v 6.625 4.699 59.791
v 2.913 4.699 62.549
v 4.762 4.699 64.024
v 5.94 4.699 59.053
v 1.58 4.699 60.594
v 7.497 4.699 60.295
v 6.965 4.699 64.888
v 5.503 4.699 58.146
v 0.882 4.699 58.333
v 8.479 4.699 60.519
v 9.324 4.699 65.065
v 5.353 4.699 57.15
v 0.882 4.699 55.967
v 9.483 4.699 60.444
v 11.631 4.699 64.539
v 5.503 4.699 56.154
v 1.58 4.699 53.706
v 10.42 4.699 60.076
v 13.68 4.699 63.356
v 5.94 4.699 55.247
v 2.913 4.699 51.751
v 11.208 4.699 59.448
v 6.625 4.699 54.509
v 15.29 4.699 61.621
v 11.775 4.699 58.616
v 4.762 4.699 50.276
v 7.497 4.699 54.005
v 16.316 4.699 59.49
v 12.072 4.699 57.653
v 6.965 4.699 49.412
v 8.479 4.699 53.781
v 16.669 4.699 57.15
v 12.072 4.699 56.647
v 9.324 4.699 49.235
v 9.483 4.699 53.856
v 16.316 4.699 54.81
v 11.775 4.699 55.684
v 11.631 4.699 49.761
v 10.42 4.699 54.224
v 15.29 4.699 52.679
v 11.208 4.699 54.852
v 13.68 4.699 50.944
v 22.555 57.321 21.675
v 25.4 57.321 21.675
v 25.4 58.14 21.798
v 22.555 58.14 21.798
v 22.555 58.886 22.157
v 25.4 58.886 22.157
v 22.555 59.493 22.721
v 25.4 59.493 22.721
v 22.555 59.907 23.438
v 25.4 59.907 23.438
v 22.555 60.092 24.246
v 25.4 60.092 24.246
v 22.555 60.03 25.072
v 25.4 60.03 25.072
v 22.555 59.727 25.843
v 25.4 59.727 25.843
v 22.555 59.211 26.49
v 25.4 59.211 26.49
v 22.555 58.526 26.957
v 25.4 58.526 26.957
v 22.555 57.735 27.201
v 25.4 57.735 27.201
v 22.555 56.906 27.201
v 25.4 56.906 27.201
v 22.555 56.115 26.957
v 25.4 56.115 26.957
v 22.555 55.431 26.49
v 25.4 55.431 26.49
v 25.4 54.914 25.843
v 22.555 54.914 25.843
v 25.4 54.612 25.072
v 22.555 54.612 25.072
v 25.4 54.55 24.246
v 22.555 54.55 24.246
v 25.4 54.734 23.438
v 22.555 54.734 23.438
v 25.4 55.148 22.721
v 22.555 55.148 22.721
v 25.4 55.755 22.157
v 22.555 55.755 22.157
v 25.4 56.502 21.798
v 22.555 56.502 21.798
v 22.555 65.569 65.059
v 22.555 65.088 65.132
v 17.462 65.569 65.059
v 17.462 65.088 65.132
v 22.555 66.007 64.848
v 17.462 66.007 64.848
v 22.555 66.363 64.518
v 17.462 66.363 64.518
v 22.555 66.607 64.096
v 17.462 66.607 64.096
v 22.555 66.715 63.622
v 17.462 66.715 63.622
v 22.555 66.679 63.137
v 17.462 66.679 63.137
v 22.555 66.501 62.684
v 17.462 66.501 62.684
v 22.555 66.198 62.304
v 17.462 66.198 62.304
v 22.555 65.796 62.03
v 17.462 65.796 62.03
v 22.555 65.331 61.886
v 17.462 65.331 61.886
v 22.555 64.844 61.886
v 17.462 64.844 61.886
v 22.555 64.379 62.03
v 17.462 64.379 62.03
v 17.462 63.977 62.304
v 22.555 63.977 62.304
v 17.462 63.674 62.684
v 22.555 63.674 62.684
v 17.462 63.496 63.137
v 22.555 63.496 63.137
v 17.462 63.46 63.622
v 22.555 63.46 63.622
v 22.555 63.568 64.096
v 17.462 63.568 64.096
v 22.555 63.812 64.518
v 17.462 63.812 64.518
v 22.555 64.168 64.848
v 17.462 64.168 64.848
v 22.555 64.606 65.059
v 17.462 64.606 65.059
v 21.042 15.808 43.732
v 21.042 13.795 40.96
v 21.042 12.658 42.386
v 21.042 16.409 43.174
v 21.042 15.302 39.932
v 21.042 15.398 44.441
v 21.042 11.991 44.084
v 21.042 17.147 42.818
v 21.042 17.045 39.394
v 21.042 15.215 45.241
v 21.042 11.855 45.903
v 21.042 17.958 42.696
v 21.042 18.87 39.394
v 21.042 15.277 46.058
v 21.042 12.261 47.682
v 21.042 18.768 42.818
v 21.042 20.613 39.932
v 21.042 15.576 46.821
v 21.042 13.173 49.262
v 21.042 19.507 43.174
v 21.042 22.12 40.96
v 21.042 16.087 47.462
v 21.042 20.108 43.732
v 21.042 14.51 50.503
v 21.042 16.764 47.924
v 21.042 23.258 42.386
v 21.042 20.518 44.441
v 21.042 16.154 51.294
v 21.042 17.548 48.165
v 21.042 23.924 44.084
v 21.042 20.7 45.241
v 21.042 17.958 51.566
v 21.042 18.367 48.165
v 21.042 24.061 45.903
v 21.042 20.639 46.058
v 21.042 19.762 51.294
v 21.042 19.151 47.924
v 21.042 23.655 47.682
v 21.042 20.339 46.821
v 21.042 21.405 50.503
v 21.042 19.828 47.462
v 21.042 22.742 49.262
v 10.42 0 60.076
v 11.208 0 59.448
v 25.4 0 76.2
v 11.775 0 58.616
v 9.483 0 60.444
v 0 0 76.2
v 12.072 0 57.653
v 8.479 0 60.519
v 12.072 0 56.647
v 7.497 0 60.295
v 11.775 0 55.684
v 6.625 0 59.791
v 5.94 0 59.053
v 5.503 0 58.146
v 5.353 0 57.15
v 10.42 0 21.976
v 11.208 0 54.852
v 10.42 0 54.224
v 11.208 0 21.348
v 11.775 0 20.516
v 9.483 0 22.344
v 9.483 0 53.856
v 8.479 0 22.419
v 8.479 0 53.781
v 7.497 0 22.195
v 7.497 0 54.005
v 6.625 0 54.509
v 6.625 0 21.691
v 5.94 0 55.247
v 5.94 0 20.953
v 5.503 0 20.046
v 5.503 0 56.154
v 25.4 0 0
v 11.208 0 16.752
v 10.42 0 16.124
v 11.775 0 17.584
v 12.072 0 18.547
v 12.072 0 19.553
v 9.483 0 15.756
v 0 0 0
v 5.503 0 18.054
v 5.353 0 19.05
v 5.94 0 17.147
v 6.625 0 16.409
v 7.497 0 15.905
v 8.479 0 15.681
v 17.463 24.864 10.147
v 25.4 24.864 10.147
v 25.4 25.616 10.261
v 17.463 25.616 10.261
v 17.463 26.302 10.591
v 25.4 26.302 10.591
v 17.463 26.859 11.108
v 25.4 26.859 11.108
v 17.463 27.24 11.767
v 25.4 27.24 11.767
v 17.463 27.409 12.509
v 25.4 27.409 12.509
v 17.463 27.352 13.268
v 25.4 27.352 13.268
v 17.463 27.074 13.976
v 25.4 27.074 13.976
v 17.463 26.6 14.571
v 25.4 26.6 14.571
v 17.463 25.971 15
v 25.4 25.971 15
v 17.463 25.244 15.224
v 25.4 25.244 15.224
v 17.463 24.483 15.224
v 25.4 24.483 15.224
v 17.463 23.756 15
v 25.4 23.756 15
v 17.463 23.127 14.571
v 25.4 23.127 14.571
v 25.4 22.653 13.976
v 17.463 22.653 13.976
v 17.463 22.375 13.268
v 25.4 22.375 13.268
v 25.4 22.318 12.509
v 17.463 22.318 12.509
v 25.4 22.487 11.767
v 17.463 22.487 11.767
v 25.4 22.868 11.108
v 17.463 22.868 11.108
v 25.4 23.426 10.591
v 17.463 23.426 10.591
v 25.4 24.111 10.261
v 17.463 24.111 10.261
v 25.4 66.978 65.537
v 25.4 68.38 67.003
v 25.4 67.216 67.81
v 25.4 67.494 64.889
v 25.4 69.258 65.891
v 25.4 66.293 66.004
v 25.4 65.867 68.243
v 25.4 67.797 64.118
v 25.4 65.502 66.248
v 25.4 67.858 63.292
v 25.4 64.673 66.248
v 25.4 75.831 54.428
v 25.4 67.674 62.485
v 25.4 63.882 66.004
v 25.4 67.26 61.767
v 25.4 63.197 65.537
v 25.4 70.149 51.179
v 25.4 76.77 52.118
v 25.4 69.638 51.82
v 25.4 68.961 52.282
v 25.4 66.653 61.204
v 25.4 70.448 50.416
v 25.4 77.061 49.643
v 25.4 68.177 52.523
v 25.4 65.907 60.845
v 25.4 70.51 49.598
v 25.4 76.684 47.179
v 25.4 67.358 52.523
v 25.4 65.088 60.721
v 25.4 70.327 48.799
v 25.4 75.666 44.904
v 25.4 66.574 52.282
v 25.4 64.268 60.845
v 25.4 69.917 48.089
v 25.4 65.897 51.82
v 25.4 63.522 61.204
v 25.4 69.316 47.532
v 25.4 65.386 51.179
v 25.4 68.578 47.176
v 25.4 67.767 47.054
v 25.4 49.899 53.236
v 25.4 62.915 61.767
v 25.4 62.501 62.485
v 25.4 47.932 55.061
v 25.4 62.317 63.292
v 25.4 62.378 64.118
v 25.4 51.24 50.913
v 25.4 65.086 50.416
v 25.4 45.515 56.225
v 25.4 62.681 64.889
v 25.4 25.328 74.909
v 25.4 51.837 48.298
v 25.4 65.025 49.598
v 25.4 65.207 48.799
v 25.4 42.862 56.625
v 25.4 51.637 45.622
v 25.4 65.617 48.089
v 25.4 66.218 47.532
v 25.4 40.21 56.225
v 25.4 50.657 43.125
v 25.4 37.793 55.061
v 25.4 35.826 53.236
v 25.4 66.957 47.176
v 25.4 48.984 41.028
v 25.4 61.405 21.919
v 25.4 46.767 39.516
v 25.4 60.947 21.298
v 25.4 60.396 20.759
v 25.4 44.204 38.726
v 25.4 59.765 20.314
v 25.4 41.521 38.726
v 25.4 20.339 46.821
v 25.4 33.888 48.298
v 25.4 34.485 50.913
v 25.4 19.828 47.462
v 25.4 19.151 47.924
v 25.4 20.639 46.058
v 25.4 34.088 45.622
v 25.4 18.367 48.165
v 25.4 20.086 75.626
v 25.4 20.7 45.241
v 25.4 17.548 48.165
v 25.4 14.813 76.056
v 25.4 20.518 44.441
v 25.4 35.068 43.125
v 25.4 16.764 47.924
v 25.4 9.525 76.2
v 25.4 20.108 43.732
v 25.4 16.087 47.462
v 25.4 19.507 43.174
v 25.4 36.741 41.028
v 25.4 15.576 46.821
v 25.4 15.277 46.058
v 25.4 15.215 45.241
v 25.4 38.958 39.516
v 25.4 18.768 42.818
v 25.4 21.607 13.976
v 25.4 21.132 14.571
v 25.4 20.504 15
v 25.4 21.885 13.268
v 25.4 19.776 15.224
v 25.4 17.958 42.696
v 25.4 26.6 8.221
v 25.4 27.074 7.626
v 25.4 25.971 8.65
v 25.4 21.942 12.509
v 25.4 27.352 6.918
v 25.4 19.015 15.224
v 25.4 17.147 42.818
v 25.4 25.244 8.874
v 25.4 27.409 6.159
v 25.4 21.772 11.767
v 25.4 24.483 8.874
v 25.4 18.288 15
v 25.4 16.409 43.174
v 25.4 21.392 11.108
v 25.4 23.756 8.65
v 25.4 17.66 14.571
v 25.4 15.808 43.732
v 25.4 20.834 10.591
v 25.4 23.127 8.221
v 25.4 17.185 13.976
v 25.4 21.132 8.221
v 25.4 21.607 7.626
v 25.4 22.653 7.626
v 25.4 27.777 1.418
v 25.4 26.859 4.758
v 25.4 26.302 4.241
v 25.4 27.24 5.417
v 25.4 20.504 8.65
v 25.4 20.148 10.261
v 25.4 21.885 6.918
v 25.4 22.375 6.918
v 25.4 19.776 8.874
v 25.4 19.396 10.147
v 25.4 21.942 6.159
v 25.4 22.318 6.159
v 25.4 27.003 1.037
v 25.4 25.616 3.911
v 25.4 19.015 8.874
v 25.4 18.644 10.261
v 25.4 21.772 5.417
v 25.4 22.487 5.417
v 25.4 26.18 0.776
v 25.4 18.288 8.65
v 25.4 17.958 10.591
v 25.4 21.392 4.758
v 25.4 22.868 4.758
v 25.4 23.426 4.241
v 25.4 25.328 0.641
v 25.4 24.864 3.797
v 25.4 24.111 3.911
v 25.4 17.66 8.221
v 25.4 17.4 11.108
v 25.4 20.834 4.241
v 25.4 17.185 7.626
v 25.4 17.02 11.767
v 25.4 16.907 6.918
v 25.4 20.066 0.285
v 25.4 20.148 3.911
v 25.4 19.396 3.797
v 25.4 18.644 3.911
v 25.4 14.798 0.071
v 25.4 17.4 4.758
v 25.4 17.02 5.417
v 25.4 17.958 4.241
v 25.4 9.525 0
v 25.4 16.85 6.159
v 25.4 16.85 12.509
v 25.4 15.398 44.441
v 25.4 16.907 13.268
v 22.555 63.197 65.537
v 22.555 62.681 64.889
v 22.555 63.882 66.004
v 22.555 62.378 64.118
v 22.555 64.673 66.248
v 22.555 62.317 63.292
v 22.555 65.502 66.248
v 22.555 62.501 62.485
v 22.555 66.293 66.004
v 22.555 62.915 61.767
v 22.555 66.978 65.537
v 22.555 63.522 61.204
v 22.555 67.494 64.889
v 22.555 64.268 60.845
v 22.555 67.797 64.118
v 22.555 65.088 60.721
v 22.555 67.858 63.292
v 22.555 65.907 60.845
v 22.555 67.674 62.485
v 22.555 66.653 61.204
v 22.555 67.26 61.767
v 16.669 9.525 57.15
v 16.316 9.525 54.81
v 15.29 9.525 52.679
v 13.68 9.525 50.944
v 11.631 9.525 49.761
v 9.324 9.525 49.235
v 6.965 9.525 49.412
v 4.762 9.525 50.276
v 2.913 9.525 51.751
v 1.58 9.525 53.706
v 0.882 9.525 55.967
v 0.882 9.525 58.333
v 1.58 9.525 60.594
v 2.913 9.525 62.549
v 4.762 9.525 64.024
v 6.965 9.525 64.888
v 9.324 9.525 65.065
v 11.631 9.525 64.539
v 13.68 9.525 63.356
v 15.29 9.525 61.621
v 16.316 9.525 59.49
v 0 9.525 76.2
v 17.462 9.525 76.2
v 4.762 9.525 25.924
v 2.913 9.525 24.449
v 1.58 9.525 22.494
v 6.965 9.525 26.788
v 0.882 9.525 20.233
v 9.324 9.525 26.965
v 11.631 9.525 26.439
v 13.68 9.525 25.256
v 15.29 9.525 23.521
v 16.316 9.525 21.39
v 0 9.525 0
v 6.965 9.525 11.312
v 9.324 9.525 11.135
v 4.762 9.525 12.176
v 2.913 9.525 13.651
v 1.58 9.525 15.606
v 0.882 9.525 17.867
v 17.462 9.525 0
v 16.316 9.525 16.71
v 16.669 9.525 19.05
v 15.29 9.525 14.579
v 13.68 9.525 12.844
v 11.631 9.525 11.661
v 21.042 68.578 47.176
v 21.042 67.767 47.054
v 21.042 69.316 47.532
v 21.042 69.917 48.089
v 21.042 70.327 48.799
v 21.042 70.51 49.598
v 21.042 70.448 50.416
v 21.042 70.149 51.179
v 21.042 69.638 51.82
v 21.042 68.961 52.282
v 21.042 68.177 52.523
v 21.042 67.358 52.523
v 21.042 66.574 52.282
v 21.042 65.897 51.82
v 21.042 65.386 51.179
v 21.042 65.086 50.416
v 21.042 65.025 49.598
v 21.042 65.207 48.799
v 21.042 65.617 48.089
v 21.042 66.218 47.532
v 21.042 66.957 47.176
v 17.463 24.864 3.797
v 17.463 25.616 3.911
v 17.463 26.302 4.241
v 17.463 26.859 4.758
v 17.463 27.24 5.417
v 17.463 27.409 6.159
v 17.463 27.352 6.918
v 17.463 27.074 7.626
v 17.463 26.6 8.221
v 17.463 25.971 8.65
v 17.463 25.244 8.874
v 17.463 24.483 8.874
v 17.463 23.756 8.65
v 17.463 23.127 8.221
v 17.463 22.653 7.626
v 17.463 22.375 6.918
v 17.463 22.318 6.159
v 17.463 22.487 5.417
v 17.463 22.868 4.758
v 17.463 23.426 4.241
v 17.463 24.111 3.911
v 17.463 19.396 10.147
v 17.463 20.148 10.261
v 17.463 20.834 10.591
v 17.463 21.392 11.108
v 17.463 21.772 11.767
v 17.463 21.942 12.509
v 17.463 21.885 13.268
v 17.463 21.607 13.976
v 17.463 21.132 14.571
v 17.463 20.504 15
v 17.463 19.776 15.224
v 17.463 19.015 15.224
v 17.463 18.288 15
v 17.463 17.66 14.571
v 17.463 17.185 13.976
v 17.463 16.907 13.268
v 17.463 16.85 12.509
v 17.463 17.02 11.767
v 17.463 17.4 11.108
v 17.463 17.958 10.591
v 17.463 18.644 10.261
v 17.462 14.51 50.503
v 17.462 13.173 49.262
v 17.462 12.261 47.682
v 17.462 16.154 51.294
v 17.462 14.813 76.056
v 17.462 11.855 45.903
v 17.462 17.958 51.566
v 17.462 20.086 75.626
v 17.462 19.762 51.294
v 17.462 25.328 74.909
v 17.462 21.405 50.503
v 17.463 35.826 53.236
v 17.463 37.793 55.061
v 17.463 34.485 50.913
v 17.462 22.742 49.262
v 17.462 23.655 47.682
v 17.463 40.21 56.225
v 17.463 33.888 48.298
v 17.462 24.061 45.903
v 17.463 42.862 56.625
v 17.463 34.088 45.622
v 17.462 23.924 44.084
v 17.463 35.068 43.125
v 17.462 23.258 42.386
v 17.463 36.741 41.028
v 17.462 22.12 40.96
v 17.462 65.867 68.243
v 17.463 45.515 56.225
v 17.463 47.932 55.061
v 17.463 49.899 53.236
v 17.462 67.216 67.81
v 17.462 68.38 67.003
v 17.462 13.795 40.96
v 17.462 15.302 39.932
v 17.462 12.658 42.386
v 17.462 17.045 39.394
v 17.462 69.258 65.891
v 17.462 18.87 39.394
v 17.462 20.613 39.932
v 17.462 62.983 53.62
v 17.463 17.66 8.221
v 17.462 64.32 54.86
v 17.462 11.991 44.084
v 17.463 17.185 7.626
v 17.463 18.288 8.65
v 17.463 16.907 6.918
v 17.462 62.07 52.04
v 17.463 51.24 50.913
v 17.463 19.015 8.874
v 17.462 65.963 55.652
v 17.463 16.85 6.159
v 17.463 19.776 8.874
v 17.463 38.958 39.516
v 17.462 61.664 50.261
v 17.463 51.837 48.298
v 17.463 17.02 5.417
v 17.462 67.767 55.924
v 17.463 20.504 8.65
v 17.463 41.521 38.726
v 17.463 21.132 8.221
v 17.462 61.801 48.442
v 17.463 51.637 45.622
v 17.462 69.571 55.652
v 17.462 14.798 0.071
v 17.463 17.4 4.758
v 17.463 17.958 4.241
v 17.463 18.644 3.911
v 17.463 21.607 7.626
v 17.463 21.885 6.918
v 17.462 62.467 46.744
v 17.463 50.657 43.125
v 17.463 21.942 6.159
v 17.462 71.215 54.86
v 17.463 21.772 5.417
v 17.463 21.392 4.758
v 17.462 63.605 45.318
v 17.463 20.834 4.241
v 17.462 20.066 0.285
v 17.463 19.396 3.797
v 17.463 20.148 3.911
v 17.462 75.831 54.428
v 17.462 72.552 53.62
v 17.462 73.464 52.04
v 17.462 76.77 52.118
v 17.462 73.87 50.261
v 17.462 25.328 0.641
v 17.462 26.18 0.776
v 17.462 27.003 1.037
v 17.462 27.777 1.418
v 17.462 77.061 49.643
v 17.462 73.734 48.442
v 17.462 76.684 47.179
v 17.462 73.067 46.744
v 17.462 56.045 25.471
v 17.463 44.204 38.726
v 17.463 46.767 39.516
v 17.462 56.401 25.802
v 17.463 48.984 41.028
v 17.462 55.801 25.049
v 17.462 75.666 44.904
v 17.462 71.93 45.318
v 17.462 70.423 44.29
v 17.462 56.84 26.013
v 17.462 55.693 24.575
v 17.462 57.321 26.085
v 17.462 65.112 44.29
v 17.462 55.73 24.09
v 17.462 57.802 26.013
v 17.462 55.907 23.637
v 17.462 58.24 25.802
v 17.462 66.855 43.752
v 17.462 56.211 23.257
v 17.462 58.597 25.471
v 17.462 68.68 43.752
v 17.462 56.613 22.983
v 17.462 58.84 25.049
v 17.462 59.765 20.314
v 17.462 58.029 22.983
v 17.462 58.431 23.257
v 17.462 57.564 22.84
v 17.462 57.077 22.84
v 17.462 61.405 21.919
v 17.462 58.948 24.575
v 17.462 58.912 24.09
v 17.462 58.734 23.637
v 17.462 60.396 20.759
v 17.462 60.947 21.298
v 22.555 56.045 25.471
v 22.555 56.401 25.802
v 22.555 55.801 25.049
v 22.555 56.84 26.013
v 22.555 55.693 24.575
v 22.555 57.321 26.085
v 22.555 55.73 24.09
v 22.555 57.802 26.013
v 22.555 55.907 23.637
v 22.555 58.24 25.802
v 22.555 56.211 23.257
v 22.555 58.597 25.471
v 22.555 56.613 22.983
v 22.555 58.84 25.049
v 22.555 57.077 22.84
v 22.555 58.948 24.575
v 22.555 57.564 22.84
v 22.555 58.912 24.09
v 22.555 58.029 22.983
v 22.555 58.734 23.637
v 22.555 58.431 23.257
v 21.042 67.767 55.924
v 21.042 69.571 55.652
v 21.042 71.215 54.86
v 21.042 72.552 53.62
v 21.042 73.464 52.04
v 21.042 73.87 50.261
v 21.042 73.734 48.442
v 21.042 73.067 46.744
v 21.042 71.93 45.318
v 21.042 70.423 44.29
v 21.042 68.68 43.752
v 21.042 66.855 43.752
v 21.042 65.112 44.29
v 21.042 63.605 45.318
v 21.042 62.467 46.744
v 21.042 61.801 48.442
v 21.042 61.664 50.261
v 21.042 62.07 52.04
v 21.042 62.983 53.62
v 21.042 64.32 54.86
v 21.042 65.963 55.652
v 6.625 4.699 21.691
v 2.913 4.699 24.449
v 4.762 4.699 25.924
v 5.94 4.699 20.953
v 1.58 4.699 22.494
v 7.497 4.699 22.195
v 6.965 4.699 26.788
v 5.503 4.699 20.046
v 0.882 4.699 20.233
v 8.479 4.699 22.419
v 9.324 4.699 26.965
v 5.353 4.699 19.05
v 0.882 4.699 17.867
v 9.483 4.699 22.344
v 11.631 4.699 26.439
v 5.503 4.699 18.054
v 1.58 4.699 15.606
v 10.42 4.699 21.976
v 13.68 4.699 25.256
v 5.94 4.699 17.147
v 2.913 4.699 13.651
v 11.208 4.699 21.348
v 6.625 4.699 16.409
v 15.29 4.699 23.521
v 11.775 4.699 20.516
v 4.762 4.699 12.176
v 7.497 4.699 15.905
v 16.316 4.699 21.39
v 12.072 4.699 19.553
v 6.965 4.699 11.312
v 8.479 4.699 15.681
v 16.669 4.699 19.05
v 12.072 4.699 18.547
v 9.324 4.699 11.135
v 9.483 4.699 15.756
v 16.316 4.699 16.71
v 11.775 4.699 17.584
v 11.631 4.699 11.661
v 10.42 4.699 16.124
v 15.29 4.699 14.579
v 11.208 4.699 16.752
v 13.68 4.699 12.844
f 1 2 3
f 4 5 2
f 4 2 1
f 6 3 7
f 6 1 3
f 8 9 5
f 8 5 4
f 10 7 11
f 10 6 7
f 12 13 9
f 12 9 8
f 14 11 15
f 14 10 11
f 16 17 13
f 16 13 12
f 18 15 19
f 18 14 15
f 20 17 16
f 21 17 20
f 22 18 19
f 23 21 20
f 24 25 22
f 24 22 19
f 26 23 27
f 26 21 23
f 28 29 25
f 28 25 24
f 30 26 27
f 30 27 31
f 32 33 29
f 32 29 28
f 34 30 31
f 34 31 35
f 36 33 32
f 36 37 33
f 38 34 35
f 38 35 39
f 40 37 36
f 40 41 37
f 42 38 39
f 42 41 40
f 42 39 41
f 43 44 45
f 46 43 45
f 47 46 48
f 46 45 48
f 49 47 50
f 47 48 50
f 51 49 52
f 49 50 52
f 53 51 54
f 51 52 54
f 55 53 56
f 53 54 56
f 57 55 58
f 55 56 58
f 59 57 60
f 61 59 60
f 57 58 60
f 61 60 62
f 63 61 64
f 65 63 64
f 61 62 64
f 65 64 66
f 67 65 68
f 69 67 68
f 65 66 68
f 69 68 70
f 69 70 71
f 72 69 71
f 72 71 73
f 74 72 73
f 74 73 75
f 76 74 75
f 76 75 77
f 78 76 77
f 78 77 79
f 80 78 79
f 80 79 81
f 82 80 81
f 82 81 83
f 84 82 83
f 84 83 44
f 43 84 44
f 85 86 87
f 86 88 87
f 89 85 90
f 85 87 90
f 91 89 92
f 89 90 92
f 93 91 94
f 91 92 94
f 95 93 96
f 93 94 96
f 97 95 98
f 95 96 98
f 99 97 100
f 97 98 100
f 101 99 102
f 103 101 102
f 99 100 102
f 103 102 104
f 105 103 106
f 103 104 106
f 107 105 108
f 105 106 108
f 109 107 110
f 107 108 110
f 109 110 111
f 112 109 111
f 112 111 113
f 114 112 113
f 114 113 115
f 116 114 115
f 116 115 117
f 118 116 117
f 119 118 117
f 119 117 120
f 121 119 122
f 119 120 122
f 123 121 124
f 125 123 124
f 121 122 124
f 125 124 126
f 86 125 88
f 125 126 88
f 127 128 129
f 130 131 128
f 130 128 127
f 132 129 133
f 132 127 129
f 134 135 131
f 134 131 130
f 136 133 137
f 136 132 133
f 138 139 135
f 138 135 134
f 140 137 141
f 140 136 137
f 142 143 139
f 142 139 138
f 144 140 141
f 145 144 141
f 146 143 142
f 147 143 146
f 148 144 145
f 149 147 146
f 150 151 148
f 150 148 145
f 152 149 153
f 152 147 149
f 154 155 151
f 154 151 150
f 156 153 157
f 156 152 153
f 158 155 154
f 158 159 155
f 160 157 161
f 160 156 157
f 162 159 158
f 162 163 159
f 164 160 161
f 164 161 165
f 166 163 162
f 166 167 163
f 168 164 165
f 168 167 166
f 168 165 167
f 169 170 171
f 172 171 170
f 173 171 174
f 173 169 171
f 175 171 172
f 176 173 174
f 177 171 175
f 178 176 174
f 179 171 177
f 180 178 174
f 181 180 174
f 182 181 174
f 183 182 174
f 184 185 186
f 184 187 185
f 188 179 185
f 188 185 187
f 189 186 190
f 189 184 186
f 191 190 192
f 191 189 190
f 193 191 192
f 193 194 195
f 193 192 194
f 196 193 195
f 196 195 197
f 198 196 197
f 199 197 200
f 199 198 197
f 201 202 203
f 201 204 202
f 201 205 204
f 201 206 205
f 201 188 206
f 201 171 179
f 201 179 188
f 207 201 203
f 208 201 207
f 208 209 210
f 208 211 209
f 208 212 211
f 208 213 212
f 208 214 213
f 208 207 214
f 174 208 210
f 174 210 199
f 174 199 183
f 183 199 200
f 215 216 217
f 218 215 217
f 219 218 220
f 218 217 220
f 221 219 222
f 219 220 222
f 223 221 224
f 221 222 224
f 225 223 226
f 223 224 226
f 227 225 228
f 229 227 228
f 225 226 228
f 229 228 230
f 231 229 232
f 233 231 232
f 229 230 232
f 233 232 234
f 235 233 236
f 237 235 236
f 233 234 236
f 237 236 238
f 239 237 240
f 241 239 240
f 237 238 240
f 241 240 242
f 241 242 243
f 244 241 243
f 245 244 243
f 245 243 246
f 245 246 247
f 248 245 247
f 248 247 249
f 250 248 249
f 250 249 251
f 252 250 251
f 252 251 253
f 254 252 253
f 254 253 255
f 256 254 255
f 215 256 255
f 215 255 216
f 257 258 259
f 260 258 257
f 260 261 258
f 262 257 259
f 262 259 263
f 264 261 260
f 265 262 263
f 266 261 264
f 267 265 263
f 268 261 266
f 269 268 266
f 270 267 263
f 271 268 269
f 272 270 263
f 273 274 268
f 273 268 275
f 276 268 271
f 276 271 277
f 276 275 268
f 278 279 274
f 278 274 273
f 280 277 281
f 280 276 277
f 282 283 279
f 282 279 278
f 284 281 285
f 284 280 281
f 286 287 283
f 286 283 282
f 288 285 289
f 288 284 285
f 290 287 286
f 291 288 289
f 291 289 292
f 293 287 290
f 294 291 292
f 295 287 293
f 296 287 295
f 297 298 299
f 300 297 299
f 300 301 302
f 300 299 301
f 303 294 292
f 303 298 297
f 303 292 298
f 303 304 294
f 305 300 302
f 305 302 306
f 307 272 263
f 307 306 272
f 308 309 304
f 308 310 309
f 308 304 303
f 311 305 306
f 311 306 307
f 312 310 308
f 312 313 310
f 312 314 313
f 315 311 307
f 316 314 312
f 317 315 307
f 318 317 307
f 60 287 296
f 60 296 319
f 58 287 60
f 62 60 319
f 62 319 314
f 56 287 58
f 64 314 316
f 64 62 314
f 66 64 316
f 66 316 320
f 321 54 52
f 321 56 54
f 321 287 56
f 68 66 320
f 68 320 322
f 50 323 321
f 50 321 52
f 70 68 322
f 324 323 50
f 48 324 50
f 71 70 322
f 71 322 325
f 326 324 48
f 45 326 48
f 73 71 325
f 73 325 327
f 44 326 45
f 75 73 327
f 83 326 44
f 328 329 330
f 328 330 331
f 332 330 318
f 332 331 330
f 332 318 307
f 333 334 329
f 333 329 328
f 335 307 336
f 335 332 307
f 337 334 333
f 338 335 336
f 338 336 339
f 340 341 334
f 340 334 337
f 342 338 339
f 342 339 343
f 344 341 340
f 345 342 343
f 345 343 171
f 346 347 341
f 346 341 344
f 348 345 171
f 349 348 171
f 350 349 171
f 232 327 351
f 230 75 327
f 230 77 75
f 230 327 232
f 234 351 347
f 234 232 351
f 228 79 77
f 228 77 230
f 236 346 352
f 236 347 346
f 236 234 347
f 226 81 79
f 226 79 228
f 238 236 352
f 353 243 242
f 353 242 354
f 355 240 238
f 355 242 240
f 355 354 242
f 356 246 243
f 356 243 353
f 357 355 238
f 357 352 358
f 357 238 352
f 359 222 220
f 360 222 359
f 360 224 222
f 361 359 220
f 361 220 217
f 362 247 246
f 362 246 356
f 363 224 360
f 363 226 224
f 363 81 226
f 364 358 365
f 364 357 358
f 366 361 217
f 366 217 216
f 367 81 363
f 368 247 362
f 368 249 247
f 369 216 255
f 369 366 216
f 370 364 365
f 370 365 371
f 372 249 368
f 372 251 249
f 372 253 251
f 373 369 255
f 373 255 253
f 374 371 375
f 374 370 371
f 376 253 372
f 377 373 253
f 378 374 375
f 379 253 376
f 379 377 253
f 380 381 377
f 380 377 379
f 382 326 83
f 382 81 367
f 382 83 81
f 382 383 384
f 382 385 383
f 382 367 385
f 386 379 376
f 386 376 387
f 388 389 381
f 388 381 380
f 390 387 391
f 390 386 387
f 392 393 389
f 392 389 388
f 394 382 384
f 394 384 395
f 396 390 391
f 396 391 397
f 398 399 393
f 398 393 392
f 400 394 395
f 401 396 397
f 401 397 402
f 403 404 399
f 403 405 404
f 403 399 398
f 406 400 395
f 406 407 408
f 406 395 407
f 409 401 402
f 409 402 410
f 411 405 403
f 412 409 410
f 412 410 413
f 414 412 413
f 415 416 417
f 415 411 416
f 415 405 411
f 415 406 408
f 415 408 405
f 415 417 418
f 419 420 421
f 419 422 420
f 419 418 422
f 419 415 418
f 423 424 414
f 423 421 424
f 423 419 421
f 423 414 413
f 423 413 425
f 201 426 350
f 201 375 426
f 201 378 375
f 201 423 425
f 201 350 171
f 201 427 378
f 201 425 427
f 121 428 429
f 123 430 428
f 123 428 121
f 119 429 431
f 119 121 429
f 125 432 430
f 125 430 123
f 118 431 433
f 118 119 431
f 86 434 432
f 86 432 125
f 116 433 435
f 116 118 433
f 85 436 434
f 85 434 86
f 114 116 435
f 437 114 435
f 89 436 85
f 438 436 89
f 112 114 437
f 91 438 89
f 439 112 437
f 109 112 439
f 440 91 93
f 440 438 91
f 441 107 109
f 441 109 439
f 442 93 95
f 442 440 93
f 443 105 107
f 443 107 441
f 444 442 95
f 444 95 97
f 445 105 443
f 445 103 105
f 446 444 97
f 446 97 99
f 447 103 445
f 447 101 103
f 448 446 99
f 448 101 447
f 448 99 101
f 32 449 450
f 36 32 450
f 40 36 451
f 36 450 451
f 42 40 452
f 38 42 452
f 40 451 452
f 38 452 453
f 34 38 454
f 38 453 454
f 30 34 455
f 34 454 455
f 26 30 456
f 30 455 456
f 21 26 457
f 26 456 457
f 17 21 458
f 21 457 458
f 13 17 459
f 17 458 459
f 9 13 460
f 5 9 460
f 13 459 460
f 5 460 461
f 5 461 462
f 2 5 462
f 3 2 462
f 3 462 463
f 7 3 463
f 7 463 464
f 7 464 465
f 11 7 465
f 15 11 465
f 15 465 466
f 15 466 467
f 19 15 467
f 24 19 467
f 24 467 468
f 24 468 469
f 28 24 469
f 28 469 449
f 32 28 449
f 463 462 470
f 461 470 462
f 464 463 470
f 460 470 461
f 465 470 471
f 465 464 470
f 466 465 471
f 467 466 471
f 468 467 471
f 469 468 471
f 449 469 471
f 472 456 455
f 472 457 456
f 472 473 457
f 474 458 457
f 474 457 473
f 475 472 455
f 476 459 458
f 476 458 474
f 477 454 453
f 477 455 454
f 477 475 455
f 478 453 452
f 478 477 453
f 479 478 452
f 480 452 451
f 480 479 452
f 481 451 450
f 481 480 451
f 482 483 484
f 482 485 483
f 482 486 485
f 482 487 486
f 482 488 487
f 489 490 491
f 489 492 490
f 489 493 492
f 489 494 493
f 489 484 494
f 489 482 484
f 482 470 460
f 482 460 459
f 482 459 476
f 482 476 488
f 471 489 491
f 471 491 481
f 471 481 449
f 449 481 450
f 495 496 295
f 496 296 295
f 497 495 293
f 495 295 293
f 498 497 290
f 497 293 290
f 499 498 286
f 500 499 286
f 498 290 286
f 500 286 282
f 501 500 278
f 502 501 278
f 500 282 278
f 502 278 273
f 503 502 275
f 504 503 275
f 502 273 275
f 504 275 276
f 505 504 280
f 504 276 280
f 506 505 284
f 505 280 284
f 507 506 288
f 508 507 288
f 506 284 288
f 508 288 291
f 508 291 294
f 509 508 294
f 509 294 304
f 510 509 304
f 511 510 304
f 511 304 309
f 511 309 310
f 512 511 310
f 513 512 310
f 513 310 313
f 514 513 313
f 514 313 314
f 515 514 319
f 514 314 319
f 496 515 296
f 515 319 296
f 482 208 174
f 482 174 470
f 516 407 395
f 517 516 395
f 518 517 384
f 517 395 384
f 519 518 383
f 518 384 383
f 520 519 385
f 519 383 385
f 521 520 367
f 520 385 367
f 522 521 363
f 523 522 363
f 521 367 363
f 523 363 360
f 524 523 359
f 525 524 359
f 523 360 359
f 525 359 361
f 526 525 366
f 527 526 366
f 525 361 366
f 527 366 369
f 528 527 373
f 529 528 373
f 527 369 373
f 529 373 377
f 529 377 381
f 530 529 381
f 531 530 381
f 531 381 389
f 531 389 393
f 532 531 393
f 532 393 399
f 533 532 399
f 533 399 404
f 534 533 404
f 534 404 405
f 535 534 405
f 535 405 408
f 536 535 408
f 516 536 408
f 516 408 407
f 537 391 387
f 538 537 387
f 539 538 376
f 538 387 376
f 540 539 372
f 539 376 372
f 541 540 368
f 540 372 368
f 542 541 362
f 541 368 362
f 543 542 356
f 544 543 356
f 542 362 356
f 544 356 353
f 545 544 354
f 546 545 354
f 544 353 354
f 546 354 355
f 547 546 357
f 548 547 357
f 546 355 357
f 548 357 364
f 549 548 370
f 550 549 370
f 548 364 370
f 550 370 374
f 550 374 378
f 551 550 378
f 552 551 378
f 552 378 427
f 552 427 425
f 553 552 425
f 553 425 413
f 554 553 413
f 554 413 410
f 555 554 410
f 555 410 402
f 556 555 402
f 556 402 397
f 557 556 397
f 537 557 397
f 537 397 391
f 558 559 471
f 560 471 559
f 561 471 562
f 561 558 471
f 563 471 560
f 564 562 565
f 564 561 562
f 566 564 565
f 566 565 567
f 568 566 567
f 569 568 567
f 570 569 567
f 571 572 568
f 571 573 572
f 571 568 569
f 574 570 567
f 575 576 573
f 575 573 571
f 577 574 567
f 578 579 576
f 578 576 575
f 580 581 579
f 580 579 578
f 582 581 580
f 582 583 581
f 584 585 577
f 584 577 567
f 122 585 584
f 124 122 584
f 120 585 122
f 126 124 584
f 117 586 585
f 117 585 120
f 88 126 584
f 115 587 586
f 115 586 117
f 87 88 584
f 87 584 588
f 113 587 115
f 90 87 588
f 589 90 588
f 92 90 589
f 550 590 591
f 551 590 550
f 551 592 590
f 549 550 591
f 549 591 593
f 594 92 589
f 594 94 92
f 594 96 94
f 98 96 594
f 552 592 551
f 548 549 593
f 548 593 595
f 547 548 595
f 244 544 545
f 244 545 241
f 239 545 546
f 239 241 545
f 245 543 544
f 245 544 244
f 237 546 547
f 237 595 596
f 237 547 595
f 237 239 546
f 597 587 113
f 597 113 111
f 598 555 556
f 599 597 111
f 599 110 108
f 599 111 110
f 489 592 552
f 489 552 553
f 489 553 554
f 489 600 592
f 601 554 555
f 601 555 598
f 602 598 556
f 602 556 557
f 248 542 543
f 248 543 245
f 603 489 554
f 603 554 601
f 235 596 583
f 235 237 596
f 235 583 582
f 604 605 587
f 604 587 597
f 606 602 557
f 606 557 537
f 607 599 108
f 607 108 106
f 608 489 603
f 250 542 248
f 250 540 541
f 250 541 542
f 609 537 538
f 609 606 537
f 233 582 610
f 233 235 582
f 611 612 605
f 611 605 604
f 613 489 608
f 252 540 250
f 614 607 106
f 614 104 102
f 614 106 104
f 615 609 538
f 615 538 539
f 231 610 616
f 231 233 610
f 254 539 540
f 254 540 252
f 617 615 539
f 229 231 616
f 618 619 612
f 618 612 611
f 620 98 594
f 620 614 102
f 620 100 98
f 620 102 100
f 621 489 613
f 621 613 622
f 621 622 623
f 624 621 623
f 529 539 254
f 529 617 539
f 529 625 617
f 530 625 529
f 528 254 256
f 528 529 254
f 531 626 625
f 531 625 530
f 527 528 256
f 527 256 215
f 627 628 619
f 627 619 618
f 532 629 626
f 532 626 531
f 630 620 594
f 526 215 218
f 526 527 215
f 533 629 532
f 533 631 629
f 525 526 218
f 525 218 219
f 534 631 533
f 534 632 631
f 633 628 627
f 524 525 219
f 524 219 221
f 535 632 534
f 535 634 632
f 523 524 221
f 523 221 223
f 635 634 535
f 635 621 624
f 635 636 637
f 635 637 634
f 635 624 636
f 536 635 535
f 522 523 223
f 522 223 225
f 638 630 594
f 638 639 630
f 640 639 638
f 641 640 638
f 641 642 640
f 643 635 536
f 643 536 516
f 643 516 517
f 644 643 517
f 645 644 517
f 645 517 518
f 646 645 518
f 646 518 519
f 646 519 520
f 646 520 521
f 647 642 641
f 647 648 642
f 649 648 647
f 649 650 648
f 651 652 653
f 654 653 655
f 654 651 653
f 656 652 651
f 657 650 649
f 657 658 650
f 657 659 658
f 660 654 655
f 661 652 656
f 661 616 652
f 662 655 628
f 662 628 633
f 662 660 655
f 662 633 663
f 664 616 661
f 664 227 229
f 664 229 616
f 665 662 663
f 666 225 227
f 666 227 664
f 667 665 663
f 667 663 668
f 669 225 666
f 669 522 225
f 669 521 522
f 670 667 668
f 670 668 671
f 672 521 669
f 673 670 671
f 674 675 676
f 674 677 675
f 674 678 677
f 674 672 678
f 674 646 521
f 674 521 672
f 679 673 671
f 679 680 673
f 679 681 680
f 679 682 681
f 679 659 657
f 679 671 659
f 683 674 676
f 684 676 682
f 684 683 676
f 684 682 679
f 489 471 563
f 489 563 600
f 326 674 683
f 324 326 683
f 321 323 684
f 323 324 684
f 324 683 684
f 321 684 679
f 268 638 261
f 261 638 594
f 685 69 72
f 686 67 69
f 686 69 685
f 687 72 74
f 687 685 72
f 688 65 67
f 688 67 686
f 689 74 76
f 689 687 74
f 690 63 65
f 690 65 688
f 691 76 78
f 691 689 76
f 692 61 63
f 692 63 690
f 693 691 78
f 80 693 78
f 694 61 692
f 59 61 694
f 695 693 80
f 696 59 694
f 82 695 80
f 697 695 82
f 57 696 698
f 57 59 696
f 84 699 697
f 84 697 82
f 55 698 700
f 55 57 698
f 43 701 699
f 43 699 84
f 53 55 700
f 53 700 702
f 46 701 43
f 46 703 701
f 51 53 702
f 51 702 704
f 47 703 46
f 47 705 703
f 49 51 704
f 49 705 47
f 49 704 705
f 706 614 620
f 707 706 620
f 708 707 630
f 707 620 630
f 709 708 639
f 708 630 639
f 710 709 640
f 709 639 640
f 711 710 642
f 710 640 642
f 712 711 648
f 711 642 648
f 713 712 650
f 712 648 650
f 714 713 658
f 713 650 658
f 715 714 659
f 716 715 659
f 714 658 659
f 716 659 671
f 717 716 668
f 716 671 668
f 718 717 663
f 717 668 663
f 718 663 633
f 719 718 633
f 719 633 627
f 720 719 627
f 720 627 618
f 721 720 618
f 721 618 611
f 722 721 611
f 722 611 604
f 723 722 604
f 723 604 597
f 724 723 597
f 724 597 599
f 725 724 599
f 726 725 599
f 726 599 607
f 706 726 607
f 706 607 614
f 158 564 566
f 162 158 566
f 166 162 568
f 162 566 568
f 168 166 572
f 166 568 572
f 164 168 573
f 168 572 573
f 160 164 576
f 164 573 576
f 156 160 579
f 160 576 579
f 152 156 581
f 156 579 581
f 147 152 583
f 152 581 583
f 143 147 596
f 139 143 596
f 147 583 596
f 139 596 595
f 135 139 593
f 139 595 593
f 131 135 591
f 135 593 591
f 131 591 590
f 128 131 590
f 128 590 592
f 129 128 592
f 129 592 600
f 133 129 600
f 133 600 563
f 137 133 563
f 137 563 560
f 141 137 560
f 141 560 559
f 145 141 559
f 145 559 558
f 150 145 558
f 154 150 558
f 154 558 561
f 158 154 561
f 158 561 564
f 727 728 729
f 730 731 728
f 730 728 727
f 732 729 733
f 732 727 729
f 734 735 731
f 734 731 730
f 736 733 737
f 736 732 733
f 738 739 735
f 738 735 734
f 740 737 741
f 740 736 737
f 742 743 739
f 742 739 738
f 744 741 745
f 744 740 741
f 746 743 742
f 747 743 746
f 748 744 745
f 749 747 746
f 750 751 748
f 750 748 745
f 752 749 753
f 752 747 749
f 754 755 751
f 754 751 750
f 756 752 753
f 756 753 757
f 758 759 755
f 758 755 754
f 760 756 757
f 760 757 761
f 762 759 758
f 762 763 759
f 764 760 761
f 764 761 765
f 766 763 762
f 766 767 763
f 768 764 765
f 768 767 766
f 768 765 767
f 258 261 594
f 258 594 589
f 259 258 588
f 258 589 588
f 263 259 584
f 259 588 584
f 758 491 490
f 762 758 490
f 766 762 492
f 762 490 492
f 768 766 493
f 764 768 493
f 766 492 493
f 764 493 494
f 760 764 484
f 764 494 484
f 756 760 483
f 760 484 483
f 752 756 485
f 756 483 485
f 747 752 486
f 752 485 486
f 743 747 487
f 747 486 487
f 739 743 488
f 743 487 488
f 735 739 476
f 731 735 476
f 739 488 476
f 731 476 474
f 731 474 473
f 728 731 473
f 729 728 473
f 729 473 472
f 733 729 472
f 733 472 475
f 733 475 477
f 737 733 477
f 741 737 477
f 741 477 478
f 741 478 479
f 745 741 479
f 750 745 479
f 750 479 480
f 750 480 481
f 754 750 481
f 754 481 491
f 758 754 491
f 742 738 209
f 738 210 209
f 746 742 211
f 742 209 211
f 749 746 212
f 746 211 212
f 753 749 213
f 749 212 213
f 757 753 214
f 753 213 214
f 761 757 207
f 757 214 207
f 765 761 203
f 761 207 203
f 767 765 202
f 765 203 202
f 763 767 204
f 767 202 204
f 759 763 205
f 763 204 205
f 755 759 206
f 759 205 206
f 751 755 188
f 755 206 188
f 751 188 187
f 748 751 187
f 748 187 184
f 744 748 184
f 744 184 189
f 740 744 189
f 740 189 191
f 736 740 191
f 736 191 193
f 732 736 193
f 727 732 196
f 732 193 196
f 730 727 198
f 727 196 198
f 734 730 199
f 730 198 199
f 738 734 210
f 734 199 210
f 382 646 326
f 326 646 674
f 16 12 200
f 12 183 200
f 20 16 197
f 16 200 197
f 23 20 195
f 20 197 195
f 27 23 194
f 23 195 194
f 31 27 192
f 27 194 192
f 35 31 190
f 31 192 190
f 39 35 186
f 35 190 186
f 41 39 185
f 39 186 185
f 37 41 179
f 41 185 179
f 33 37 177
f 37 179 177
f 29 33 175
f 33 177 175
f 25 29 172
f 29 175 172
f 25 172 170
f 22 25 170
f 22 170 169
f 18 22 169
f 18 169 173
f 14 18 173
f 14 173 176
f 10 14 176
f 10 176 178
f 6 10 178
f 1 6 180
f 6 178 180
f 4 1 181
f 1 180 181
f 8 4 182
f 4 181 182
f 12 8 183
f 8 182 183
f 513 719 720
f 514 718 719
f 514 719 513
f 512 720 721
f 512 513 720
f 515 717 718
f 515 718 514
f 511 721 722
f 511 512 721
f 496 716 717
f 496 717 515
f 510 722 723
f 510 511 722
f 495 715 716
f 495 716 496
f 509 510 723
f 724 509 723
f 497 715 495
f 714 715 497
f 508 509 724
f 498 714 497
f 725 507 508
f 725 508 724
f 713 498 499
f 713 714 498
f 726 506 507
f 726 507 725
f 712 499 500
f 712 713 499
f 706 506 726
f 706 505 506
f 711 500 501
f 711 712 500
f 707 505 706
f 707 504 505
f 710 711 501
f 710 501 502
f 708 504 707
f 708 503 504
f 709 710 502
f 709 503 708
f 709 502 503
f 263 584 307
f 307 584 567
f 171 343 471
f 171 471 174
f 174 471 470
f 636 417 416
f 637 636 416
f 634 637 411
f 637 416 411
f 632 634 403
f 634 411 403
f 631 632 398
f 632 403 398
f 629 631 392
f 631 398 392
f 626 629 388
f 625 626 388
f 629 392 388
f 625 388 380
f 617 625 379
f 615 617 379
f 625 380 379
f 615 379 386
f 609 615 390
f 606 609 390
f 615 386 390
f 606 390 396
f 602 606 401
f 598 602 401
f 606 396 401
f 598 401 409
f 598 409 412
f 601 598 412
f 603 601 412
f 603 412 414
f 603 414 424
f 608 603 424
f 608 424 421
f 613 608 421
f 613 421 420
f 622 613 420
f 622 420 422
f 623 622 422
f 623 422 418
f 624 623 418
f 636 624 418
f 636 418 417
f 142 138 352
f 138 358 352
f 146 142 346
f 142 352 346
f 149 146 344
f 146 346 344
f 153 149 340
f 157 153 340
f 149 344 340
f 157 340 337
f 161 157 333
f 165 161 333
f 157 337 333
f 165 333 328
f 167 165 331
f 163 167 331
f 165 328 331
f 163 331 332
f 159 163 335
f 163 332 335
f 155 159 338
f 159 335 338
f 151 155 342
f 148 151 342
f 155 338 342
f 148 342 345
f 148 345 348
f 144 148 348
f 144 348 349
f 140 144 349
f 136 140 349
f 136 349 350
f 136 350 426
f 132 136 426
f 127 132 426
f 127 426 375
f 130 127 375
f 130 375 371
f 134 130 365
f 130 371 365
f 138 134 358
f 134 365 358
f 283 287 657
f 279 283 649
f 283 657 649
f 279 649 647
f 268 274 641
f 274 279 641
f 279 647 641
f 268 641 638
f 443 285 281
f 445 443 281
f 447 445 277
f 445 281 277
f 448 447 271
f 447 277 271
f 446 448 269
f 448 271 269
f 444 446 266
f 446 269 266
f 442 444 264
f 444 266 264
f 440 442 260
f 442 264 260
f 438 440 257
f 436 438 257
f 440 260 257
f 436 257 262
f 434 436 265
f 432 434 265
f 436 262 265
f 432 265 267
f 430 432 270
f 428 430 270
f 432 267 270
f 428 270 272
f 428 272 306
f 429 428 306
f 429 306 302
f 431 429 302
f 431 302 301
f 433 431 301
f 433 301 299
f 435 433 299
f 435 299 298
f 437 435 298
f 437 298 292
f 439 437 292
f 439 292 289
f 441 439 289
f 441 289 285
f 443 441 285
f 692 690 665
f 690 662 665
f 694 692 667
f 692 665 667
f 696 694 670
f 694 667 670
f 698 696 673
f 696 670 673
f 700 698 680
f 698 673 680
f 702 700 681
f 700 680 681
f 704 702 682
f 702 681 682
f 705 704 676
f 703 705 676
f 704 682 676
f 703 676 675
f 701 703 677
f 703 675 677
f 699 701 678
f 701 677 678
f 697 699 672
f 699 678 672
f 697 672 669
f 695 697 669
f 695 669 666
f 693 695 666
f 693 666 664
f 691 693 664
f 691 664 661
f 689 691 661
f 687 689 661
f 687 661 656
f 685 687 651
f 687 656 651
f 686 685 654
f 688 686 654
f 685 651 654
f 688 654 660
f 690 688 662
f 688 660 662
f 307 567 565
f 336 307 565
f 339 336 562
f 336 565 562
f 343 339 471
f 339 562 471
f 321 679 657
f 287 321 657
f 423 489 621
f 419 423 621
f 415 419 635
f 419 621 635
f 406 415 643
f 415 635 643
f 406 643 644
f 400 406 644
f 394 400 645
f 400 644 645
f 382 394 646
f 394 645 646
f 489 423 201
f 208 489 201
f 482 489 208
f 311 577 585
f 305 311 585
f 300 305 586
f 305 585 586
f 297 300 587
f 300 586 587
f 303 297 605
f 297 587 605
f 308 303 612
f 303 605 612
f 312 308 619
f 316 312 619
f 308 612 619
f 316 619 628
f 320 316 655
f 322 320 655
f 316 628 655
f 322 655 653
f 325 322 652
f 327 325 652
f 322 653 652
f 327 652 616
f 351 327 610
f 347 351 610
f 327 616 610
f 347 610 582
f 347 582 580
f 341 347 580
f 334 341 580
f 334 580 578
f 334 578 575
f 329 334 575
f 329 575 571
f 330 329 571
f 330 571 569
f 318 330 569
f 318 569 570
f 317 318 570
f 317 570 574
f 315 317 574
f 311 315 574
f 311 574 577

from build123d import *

# Parameters (mm, degrees)
BOSS_EXTRUDE1_DEPTH                            = 76.2
F_18_0MM_DIAMETER_HOLE1_D                      = 18
CBORE_FOR_M5_HEX_HEAD_BOLT1_D                  = 5.5
CBORE_FOR_M5_HEX_HEAD_BOLT1_DEPTH              = 45.974
CBORE_FOR_M5_HEX_HEAD_BOLT1_CBORE_D            = 12.24
CBORE_FOR_M5_HEX_HEAD_BOLT1_CBORE_DEPTH        = 3.58
CBORE_FOR_M5_HEX_HEAD_BOLT1_TIP                = 1.652366702
CBORE_FOR_4_SOCKET_HEAD_CAP_SCREW1_D           = 3.2639
CBORE_FOR_4_SOCKET_HEAD_CAP_SCREW1_DEPTH       = 45.974
CBORE_FOR_4_SOCKET_HEAD_CAP_SCREW1_CBORE_D     = 5.55752
CBORE_FOR_4_SOCKET_HEAD_CAP_SCREW1_CBORE_DEPTH = 2.8448
CBORE_FOR_4_SOCKET_HEAD_CAP_SCREW1_TIP         = 0.980574487
F_10_CLEARANCE_HOLE1_D                         = 5.1054
CUT_EXTRUDE2_DEPTH                             = 26.4
CUT_EXTRUDE2_DEPTH_BACK                        = 1
CBORE_FOR_1_4_HEX_MACHINE_SCREW1_D             = 6.7564
CBORE_FOR_1_4_HEX_MACHINE_SCREW1_CBORE_D       = 15.875
CBORE_FOR_1_4_HEX_MACHINE_SCREW1_CBORE_DEPTH   = 4.826


with BuildPart() as part:
    # Sketch1 → Boss-Extrude1 (new body)
    with BuildSketch(Plane.XY):
        Polygon((0, 0), (0, 9.525), (17.4625, 9.525), (17.4625, 79.375), (25.4, 79.375), (25.4, 0), align=None)
    extrude(amount=BOSS_EXTRUDE1_DEPTH)

    # Ø18.0mm Diameter Hole1 (through all)
    with Locations(Plane(origin=(25.4, 0, 0), x_dir=(0, 0, -1), z_dir=(1, 0, 0))):
        with Locations((-47.625, 42.8625)):
            Hole(F_18_0MM_DIAMETER_HOLE1_D / 2)

    # CBORE for M5 Hex Head Bolt1
    with Locations(Plane.ZY.offset(-17.4625)):
        with Locations((49.803893572, 67.76736749), (45.446106428, 17.95763251)):
            CounterBoreHole(CBORE_FOR_M5_HEX_HEAD_BOLT1_D / 2, CBORE_FOR_M5_HEX_HEAD_BOLT1_CBORE_D / 2, CBORE_FOR_M5_HEX_HEAD_BOLT1_CBORE_DEPTH, depth=CBORE_FOR_M5_HEX_HEAD_BOLT1_DEPTH)
            with Locations((0, 0, -(CBORE_FOR_M5_HEX_HEAD_BOLT1_DEPTH + CBORE_FOR_M5_HEX_HEAD_BOLT1_TIP / 2))):  # 118° drill point
                Cone(0, CBORE_FOR_M5_HEX_HEAD_BOLT1_D / 2, CBORE_FOR_M5_HEX_HEAD_BOLT1_TIP, mode=Mode.SUBTRACT)

    # CBORE for #4 Socket Head Cap Screw1
    with Locations(Plane(origin=(25.4, 0, 0), x_dir=(0, 0, -1), z_dir=(1, 0, 0))):
        with Locations((-24.453273137, 57.320623121), (-63.5, 65.0875)):
            CounterBoreHole(CBORE_FOR_4_SOCKET_HEAD_CAP_SCREW1_D / 2, CBORE_FOR_4_SOCKET_HEAD_CAP_SCREW1_CBORE_D / 2, CBORE_FOR_4_SOCKET_HEAD_CAP_SCREW1_CBORE_DEPTH, depth=CBORE_FOR_4_SOCKET_HEAD_CAP_SCREW1_DEPTH)
            with Locations((0, 0, -(CBORE_FOR_4_SOCKET_HEAD_CAP_SCREW1_DEPTH + CBORE_FOR_4_SOCKET_HEAD_CAP_SCREW1_TIP / 2))):  # 118° drill point
                Cone(0, CBORE_FOR_4_SOCKET_HEAD_CAP_SCREW1_D / 2, CBORE_FOR_4_SOCKET_HEAD_CAP_SCREW1_TIP, mode=Mode.SUBTRACT)

    # #10 Clearance Hole1 (through all)
    with Locations(Plane.ZY.offset(-17.4625)):
        with Locations((6.35, 24.863549414), (12.7, 24.863549414), (6.35, 19.395959874), (12.7, 19.395959874)):
            Hole(F_10_CLEARANCE_HOLE1_D / 2)

    # Sketch10 → Cut-Extrude2 (cut, two sides)
    with BuildSketch(Plane(origin=(0, 0, 0), x_dir=(0, 0, -1), z_dir=(1, 0, 0))) as cut_extrude2_sk:
        with BuildLine():
            ThreePointArc((-74.909422182, 25.327542498), (-75.876819337, 17.452577507), (-76.2, 9.525))
            Line((-76.2, 9.525), (-76.2, 79.375))
            Line((-76.2, 79.375), (0, 79.375))
            Line((0, 79.375), (0, 9.525))
            ThreePointArc((0, 9.525), (-0.160347065, 17.432771339), (-0.641124655, 25.327542498))
            ThreePointArc((-0.641124655, 25.327542498), (-0.890670545, 26.596255157), (-1.418437728, 27.776664731))
            Line((-1.418437728, 27.776664731), (-20.314478636, 59.765443848))
            ThreePointArc((-20.314478636, 59.765443848), (-21.017481453, 60.682483292), (-21.919014013, 61.405264965))
            Line((-21.919014013, 61.405264965), (-44.903501732, 75.665670144))
            ThreePointArc((-44.903501732, 75.665670144), (-49.642737782, 77.060970334), (-54.427500457, 75.830821116))
            Line((-54.427500457, 75.830821116), (-65.891118571, 69.257550393))
            ThreePointArc((-65.891118571, 69.257550393), (-67.449429859, 67.827713877), (-68.243251822, 65.867455417))
            Line((-68.243251822, 65.867455417), (-74.909422182, 25.327542498))
        make_face()
    extrude(amount=CUT_EXTRUDE2_DEPTH, mode=Mode.SUBTRACT)
    extrude(cut_extrude2_sk.sketch, amount=-CUT_EXTRUDE2_DEPTH_BACK, mode=Mode.SUBTRACT)

    # CBORE for 1/4 Hex Machine Screw1 (through all)
    with Locations(Plane(origin=(0, 9.525, 0), x_dir=(1, 0, 0), z_dir=(0, 1, 0))):
        with Locations((8.73125, -19.05), (8.73125, -57.15)):
            CounterBoreHole(CBORE_FOR_1_4_HEX_MACHINE_SCREW1_D / 2, CBORE_FOR_1_4_HEX_MACHINE_SCREW1_CBORE_D / 2, CBORE_FOR_1_4_HEX_MACHINE_SCREW1_CBORE_DEPTH)


solid = part.part
